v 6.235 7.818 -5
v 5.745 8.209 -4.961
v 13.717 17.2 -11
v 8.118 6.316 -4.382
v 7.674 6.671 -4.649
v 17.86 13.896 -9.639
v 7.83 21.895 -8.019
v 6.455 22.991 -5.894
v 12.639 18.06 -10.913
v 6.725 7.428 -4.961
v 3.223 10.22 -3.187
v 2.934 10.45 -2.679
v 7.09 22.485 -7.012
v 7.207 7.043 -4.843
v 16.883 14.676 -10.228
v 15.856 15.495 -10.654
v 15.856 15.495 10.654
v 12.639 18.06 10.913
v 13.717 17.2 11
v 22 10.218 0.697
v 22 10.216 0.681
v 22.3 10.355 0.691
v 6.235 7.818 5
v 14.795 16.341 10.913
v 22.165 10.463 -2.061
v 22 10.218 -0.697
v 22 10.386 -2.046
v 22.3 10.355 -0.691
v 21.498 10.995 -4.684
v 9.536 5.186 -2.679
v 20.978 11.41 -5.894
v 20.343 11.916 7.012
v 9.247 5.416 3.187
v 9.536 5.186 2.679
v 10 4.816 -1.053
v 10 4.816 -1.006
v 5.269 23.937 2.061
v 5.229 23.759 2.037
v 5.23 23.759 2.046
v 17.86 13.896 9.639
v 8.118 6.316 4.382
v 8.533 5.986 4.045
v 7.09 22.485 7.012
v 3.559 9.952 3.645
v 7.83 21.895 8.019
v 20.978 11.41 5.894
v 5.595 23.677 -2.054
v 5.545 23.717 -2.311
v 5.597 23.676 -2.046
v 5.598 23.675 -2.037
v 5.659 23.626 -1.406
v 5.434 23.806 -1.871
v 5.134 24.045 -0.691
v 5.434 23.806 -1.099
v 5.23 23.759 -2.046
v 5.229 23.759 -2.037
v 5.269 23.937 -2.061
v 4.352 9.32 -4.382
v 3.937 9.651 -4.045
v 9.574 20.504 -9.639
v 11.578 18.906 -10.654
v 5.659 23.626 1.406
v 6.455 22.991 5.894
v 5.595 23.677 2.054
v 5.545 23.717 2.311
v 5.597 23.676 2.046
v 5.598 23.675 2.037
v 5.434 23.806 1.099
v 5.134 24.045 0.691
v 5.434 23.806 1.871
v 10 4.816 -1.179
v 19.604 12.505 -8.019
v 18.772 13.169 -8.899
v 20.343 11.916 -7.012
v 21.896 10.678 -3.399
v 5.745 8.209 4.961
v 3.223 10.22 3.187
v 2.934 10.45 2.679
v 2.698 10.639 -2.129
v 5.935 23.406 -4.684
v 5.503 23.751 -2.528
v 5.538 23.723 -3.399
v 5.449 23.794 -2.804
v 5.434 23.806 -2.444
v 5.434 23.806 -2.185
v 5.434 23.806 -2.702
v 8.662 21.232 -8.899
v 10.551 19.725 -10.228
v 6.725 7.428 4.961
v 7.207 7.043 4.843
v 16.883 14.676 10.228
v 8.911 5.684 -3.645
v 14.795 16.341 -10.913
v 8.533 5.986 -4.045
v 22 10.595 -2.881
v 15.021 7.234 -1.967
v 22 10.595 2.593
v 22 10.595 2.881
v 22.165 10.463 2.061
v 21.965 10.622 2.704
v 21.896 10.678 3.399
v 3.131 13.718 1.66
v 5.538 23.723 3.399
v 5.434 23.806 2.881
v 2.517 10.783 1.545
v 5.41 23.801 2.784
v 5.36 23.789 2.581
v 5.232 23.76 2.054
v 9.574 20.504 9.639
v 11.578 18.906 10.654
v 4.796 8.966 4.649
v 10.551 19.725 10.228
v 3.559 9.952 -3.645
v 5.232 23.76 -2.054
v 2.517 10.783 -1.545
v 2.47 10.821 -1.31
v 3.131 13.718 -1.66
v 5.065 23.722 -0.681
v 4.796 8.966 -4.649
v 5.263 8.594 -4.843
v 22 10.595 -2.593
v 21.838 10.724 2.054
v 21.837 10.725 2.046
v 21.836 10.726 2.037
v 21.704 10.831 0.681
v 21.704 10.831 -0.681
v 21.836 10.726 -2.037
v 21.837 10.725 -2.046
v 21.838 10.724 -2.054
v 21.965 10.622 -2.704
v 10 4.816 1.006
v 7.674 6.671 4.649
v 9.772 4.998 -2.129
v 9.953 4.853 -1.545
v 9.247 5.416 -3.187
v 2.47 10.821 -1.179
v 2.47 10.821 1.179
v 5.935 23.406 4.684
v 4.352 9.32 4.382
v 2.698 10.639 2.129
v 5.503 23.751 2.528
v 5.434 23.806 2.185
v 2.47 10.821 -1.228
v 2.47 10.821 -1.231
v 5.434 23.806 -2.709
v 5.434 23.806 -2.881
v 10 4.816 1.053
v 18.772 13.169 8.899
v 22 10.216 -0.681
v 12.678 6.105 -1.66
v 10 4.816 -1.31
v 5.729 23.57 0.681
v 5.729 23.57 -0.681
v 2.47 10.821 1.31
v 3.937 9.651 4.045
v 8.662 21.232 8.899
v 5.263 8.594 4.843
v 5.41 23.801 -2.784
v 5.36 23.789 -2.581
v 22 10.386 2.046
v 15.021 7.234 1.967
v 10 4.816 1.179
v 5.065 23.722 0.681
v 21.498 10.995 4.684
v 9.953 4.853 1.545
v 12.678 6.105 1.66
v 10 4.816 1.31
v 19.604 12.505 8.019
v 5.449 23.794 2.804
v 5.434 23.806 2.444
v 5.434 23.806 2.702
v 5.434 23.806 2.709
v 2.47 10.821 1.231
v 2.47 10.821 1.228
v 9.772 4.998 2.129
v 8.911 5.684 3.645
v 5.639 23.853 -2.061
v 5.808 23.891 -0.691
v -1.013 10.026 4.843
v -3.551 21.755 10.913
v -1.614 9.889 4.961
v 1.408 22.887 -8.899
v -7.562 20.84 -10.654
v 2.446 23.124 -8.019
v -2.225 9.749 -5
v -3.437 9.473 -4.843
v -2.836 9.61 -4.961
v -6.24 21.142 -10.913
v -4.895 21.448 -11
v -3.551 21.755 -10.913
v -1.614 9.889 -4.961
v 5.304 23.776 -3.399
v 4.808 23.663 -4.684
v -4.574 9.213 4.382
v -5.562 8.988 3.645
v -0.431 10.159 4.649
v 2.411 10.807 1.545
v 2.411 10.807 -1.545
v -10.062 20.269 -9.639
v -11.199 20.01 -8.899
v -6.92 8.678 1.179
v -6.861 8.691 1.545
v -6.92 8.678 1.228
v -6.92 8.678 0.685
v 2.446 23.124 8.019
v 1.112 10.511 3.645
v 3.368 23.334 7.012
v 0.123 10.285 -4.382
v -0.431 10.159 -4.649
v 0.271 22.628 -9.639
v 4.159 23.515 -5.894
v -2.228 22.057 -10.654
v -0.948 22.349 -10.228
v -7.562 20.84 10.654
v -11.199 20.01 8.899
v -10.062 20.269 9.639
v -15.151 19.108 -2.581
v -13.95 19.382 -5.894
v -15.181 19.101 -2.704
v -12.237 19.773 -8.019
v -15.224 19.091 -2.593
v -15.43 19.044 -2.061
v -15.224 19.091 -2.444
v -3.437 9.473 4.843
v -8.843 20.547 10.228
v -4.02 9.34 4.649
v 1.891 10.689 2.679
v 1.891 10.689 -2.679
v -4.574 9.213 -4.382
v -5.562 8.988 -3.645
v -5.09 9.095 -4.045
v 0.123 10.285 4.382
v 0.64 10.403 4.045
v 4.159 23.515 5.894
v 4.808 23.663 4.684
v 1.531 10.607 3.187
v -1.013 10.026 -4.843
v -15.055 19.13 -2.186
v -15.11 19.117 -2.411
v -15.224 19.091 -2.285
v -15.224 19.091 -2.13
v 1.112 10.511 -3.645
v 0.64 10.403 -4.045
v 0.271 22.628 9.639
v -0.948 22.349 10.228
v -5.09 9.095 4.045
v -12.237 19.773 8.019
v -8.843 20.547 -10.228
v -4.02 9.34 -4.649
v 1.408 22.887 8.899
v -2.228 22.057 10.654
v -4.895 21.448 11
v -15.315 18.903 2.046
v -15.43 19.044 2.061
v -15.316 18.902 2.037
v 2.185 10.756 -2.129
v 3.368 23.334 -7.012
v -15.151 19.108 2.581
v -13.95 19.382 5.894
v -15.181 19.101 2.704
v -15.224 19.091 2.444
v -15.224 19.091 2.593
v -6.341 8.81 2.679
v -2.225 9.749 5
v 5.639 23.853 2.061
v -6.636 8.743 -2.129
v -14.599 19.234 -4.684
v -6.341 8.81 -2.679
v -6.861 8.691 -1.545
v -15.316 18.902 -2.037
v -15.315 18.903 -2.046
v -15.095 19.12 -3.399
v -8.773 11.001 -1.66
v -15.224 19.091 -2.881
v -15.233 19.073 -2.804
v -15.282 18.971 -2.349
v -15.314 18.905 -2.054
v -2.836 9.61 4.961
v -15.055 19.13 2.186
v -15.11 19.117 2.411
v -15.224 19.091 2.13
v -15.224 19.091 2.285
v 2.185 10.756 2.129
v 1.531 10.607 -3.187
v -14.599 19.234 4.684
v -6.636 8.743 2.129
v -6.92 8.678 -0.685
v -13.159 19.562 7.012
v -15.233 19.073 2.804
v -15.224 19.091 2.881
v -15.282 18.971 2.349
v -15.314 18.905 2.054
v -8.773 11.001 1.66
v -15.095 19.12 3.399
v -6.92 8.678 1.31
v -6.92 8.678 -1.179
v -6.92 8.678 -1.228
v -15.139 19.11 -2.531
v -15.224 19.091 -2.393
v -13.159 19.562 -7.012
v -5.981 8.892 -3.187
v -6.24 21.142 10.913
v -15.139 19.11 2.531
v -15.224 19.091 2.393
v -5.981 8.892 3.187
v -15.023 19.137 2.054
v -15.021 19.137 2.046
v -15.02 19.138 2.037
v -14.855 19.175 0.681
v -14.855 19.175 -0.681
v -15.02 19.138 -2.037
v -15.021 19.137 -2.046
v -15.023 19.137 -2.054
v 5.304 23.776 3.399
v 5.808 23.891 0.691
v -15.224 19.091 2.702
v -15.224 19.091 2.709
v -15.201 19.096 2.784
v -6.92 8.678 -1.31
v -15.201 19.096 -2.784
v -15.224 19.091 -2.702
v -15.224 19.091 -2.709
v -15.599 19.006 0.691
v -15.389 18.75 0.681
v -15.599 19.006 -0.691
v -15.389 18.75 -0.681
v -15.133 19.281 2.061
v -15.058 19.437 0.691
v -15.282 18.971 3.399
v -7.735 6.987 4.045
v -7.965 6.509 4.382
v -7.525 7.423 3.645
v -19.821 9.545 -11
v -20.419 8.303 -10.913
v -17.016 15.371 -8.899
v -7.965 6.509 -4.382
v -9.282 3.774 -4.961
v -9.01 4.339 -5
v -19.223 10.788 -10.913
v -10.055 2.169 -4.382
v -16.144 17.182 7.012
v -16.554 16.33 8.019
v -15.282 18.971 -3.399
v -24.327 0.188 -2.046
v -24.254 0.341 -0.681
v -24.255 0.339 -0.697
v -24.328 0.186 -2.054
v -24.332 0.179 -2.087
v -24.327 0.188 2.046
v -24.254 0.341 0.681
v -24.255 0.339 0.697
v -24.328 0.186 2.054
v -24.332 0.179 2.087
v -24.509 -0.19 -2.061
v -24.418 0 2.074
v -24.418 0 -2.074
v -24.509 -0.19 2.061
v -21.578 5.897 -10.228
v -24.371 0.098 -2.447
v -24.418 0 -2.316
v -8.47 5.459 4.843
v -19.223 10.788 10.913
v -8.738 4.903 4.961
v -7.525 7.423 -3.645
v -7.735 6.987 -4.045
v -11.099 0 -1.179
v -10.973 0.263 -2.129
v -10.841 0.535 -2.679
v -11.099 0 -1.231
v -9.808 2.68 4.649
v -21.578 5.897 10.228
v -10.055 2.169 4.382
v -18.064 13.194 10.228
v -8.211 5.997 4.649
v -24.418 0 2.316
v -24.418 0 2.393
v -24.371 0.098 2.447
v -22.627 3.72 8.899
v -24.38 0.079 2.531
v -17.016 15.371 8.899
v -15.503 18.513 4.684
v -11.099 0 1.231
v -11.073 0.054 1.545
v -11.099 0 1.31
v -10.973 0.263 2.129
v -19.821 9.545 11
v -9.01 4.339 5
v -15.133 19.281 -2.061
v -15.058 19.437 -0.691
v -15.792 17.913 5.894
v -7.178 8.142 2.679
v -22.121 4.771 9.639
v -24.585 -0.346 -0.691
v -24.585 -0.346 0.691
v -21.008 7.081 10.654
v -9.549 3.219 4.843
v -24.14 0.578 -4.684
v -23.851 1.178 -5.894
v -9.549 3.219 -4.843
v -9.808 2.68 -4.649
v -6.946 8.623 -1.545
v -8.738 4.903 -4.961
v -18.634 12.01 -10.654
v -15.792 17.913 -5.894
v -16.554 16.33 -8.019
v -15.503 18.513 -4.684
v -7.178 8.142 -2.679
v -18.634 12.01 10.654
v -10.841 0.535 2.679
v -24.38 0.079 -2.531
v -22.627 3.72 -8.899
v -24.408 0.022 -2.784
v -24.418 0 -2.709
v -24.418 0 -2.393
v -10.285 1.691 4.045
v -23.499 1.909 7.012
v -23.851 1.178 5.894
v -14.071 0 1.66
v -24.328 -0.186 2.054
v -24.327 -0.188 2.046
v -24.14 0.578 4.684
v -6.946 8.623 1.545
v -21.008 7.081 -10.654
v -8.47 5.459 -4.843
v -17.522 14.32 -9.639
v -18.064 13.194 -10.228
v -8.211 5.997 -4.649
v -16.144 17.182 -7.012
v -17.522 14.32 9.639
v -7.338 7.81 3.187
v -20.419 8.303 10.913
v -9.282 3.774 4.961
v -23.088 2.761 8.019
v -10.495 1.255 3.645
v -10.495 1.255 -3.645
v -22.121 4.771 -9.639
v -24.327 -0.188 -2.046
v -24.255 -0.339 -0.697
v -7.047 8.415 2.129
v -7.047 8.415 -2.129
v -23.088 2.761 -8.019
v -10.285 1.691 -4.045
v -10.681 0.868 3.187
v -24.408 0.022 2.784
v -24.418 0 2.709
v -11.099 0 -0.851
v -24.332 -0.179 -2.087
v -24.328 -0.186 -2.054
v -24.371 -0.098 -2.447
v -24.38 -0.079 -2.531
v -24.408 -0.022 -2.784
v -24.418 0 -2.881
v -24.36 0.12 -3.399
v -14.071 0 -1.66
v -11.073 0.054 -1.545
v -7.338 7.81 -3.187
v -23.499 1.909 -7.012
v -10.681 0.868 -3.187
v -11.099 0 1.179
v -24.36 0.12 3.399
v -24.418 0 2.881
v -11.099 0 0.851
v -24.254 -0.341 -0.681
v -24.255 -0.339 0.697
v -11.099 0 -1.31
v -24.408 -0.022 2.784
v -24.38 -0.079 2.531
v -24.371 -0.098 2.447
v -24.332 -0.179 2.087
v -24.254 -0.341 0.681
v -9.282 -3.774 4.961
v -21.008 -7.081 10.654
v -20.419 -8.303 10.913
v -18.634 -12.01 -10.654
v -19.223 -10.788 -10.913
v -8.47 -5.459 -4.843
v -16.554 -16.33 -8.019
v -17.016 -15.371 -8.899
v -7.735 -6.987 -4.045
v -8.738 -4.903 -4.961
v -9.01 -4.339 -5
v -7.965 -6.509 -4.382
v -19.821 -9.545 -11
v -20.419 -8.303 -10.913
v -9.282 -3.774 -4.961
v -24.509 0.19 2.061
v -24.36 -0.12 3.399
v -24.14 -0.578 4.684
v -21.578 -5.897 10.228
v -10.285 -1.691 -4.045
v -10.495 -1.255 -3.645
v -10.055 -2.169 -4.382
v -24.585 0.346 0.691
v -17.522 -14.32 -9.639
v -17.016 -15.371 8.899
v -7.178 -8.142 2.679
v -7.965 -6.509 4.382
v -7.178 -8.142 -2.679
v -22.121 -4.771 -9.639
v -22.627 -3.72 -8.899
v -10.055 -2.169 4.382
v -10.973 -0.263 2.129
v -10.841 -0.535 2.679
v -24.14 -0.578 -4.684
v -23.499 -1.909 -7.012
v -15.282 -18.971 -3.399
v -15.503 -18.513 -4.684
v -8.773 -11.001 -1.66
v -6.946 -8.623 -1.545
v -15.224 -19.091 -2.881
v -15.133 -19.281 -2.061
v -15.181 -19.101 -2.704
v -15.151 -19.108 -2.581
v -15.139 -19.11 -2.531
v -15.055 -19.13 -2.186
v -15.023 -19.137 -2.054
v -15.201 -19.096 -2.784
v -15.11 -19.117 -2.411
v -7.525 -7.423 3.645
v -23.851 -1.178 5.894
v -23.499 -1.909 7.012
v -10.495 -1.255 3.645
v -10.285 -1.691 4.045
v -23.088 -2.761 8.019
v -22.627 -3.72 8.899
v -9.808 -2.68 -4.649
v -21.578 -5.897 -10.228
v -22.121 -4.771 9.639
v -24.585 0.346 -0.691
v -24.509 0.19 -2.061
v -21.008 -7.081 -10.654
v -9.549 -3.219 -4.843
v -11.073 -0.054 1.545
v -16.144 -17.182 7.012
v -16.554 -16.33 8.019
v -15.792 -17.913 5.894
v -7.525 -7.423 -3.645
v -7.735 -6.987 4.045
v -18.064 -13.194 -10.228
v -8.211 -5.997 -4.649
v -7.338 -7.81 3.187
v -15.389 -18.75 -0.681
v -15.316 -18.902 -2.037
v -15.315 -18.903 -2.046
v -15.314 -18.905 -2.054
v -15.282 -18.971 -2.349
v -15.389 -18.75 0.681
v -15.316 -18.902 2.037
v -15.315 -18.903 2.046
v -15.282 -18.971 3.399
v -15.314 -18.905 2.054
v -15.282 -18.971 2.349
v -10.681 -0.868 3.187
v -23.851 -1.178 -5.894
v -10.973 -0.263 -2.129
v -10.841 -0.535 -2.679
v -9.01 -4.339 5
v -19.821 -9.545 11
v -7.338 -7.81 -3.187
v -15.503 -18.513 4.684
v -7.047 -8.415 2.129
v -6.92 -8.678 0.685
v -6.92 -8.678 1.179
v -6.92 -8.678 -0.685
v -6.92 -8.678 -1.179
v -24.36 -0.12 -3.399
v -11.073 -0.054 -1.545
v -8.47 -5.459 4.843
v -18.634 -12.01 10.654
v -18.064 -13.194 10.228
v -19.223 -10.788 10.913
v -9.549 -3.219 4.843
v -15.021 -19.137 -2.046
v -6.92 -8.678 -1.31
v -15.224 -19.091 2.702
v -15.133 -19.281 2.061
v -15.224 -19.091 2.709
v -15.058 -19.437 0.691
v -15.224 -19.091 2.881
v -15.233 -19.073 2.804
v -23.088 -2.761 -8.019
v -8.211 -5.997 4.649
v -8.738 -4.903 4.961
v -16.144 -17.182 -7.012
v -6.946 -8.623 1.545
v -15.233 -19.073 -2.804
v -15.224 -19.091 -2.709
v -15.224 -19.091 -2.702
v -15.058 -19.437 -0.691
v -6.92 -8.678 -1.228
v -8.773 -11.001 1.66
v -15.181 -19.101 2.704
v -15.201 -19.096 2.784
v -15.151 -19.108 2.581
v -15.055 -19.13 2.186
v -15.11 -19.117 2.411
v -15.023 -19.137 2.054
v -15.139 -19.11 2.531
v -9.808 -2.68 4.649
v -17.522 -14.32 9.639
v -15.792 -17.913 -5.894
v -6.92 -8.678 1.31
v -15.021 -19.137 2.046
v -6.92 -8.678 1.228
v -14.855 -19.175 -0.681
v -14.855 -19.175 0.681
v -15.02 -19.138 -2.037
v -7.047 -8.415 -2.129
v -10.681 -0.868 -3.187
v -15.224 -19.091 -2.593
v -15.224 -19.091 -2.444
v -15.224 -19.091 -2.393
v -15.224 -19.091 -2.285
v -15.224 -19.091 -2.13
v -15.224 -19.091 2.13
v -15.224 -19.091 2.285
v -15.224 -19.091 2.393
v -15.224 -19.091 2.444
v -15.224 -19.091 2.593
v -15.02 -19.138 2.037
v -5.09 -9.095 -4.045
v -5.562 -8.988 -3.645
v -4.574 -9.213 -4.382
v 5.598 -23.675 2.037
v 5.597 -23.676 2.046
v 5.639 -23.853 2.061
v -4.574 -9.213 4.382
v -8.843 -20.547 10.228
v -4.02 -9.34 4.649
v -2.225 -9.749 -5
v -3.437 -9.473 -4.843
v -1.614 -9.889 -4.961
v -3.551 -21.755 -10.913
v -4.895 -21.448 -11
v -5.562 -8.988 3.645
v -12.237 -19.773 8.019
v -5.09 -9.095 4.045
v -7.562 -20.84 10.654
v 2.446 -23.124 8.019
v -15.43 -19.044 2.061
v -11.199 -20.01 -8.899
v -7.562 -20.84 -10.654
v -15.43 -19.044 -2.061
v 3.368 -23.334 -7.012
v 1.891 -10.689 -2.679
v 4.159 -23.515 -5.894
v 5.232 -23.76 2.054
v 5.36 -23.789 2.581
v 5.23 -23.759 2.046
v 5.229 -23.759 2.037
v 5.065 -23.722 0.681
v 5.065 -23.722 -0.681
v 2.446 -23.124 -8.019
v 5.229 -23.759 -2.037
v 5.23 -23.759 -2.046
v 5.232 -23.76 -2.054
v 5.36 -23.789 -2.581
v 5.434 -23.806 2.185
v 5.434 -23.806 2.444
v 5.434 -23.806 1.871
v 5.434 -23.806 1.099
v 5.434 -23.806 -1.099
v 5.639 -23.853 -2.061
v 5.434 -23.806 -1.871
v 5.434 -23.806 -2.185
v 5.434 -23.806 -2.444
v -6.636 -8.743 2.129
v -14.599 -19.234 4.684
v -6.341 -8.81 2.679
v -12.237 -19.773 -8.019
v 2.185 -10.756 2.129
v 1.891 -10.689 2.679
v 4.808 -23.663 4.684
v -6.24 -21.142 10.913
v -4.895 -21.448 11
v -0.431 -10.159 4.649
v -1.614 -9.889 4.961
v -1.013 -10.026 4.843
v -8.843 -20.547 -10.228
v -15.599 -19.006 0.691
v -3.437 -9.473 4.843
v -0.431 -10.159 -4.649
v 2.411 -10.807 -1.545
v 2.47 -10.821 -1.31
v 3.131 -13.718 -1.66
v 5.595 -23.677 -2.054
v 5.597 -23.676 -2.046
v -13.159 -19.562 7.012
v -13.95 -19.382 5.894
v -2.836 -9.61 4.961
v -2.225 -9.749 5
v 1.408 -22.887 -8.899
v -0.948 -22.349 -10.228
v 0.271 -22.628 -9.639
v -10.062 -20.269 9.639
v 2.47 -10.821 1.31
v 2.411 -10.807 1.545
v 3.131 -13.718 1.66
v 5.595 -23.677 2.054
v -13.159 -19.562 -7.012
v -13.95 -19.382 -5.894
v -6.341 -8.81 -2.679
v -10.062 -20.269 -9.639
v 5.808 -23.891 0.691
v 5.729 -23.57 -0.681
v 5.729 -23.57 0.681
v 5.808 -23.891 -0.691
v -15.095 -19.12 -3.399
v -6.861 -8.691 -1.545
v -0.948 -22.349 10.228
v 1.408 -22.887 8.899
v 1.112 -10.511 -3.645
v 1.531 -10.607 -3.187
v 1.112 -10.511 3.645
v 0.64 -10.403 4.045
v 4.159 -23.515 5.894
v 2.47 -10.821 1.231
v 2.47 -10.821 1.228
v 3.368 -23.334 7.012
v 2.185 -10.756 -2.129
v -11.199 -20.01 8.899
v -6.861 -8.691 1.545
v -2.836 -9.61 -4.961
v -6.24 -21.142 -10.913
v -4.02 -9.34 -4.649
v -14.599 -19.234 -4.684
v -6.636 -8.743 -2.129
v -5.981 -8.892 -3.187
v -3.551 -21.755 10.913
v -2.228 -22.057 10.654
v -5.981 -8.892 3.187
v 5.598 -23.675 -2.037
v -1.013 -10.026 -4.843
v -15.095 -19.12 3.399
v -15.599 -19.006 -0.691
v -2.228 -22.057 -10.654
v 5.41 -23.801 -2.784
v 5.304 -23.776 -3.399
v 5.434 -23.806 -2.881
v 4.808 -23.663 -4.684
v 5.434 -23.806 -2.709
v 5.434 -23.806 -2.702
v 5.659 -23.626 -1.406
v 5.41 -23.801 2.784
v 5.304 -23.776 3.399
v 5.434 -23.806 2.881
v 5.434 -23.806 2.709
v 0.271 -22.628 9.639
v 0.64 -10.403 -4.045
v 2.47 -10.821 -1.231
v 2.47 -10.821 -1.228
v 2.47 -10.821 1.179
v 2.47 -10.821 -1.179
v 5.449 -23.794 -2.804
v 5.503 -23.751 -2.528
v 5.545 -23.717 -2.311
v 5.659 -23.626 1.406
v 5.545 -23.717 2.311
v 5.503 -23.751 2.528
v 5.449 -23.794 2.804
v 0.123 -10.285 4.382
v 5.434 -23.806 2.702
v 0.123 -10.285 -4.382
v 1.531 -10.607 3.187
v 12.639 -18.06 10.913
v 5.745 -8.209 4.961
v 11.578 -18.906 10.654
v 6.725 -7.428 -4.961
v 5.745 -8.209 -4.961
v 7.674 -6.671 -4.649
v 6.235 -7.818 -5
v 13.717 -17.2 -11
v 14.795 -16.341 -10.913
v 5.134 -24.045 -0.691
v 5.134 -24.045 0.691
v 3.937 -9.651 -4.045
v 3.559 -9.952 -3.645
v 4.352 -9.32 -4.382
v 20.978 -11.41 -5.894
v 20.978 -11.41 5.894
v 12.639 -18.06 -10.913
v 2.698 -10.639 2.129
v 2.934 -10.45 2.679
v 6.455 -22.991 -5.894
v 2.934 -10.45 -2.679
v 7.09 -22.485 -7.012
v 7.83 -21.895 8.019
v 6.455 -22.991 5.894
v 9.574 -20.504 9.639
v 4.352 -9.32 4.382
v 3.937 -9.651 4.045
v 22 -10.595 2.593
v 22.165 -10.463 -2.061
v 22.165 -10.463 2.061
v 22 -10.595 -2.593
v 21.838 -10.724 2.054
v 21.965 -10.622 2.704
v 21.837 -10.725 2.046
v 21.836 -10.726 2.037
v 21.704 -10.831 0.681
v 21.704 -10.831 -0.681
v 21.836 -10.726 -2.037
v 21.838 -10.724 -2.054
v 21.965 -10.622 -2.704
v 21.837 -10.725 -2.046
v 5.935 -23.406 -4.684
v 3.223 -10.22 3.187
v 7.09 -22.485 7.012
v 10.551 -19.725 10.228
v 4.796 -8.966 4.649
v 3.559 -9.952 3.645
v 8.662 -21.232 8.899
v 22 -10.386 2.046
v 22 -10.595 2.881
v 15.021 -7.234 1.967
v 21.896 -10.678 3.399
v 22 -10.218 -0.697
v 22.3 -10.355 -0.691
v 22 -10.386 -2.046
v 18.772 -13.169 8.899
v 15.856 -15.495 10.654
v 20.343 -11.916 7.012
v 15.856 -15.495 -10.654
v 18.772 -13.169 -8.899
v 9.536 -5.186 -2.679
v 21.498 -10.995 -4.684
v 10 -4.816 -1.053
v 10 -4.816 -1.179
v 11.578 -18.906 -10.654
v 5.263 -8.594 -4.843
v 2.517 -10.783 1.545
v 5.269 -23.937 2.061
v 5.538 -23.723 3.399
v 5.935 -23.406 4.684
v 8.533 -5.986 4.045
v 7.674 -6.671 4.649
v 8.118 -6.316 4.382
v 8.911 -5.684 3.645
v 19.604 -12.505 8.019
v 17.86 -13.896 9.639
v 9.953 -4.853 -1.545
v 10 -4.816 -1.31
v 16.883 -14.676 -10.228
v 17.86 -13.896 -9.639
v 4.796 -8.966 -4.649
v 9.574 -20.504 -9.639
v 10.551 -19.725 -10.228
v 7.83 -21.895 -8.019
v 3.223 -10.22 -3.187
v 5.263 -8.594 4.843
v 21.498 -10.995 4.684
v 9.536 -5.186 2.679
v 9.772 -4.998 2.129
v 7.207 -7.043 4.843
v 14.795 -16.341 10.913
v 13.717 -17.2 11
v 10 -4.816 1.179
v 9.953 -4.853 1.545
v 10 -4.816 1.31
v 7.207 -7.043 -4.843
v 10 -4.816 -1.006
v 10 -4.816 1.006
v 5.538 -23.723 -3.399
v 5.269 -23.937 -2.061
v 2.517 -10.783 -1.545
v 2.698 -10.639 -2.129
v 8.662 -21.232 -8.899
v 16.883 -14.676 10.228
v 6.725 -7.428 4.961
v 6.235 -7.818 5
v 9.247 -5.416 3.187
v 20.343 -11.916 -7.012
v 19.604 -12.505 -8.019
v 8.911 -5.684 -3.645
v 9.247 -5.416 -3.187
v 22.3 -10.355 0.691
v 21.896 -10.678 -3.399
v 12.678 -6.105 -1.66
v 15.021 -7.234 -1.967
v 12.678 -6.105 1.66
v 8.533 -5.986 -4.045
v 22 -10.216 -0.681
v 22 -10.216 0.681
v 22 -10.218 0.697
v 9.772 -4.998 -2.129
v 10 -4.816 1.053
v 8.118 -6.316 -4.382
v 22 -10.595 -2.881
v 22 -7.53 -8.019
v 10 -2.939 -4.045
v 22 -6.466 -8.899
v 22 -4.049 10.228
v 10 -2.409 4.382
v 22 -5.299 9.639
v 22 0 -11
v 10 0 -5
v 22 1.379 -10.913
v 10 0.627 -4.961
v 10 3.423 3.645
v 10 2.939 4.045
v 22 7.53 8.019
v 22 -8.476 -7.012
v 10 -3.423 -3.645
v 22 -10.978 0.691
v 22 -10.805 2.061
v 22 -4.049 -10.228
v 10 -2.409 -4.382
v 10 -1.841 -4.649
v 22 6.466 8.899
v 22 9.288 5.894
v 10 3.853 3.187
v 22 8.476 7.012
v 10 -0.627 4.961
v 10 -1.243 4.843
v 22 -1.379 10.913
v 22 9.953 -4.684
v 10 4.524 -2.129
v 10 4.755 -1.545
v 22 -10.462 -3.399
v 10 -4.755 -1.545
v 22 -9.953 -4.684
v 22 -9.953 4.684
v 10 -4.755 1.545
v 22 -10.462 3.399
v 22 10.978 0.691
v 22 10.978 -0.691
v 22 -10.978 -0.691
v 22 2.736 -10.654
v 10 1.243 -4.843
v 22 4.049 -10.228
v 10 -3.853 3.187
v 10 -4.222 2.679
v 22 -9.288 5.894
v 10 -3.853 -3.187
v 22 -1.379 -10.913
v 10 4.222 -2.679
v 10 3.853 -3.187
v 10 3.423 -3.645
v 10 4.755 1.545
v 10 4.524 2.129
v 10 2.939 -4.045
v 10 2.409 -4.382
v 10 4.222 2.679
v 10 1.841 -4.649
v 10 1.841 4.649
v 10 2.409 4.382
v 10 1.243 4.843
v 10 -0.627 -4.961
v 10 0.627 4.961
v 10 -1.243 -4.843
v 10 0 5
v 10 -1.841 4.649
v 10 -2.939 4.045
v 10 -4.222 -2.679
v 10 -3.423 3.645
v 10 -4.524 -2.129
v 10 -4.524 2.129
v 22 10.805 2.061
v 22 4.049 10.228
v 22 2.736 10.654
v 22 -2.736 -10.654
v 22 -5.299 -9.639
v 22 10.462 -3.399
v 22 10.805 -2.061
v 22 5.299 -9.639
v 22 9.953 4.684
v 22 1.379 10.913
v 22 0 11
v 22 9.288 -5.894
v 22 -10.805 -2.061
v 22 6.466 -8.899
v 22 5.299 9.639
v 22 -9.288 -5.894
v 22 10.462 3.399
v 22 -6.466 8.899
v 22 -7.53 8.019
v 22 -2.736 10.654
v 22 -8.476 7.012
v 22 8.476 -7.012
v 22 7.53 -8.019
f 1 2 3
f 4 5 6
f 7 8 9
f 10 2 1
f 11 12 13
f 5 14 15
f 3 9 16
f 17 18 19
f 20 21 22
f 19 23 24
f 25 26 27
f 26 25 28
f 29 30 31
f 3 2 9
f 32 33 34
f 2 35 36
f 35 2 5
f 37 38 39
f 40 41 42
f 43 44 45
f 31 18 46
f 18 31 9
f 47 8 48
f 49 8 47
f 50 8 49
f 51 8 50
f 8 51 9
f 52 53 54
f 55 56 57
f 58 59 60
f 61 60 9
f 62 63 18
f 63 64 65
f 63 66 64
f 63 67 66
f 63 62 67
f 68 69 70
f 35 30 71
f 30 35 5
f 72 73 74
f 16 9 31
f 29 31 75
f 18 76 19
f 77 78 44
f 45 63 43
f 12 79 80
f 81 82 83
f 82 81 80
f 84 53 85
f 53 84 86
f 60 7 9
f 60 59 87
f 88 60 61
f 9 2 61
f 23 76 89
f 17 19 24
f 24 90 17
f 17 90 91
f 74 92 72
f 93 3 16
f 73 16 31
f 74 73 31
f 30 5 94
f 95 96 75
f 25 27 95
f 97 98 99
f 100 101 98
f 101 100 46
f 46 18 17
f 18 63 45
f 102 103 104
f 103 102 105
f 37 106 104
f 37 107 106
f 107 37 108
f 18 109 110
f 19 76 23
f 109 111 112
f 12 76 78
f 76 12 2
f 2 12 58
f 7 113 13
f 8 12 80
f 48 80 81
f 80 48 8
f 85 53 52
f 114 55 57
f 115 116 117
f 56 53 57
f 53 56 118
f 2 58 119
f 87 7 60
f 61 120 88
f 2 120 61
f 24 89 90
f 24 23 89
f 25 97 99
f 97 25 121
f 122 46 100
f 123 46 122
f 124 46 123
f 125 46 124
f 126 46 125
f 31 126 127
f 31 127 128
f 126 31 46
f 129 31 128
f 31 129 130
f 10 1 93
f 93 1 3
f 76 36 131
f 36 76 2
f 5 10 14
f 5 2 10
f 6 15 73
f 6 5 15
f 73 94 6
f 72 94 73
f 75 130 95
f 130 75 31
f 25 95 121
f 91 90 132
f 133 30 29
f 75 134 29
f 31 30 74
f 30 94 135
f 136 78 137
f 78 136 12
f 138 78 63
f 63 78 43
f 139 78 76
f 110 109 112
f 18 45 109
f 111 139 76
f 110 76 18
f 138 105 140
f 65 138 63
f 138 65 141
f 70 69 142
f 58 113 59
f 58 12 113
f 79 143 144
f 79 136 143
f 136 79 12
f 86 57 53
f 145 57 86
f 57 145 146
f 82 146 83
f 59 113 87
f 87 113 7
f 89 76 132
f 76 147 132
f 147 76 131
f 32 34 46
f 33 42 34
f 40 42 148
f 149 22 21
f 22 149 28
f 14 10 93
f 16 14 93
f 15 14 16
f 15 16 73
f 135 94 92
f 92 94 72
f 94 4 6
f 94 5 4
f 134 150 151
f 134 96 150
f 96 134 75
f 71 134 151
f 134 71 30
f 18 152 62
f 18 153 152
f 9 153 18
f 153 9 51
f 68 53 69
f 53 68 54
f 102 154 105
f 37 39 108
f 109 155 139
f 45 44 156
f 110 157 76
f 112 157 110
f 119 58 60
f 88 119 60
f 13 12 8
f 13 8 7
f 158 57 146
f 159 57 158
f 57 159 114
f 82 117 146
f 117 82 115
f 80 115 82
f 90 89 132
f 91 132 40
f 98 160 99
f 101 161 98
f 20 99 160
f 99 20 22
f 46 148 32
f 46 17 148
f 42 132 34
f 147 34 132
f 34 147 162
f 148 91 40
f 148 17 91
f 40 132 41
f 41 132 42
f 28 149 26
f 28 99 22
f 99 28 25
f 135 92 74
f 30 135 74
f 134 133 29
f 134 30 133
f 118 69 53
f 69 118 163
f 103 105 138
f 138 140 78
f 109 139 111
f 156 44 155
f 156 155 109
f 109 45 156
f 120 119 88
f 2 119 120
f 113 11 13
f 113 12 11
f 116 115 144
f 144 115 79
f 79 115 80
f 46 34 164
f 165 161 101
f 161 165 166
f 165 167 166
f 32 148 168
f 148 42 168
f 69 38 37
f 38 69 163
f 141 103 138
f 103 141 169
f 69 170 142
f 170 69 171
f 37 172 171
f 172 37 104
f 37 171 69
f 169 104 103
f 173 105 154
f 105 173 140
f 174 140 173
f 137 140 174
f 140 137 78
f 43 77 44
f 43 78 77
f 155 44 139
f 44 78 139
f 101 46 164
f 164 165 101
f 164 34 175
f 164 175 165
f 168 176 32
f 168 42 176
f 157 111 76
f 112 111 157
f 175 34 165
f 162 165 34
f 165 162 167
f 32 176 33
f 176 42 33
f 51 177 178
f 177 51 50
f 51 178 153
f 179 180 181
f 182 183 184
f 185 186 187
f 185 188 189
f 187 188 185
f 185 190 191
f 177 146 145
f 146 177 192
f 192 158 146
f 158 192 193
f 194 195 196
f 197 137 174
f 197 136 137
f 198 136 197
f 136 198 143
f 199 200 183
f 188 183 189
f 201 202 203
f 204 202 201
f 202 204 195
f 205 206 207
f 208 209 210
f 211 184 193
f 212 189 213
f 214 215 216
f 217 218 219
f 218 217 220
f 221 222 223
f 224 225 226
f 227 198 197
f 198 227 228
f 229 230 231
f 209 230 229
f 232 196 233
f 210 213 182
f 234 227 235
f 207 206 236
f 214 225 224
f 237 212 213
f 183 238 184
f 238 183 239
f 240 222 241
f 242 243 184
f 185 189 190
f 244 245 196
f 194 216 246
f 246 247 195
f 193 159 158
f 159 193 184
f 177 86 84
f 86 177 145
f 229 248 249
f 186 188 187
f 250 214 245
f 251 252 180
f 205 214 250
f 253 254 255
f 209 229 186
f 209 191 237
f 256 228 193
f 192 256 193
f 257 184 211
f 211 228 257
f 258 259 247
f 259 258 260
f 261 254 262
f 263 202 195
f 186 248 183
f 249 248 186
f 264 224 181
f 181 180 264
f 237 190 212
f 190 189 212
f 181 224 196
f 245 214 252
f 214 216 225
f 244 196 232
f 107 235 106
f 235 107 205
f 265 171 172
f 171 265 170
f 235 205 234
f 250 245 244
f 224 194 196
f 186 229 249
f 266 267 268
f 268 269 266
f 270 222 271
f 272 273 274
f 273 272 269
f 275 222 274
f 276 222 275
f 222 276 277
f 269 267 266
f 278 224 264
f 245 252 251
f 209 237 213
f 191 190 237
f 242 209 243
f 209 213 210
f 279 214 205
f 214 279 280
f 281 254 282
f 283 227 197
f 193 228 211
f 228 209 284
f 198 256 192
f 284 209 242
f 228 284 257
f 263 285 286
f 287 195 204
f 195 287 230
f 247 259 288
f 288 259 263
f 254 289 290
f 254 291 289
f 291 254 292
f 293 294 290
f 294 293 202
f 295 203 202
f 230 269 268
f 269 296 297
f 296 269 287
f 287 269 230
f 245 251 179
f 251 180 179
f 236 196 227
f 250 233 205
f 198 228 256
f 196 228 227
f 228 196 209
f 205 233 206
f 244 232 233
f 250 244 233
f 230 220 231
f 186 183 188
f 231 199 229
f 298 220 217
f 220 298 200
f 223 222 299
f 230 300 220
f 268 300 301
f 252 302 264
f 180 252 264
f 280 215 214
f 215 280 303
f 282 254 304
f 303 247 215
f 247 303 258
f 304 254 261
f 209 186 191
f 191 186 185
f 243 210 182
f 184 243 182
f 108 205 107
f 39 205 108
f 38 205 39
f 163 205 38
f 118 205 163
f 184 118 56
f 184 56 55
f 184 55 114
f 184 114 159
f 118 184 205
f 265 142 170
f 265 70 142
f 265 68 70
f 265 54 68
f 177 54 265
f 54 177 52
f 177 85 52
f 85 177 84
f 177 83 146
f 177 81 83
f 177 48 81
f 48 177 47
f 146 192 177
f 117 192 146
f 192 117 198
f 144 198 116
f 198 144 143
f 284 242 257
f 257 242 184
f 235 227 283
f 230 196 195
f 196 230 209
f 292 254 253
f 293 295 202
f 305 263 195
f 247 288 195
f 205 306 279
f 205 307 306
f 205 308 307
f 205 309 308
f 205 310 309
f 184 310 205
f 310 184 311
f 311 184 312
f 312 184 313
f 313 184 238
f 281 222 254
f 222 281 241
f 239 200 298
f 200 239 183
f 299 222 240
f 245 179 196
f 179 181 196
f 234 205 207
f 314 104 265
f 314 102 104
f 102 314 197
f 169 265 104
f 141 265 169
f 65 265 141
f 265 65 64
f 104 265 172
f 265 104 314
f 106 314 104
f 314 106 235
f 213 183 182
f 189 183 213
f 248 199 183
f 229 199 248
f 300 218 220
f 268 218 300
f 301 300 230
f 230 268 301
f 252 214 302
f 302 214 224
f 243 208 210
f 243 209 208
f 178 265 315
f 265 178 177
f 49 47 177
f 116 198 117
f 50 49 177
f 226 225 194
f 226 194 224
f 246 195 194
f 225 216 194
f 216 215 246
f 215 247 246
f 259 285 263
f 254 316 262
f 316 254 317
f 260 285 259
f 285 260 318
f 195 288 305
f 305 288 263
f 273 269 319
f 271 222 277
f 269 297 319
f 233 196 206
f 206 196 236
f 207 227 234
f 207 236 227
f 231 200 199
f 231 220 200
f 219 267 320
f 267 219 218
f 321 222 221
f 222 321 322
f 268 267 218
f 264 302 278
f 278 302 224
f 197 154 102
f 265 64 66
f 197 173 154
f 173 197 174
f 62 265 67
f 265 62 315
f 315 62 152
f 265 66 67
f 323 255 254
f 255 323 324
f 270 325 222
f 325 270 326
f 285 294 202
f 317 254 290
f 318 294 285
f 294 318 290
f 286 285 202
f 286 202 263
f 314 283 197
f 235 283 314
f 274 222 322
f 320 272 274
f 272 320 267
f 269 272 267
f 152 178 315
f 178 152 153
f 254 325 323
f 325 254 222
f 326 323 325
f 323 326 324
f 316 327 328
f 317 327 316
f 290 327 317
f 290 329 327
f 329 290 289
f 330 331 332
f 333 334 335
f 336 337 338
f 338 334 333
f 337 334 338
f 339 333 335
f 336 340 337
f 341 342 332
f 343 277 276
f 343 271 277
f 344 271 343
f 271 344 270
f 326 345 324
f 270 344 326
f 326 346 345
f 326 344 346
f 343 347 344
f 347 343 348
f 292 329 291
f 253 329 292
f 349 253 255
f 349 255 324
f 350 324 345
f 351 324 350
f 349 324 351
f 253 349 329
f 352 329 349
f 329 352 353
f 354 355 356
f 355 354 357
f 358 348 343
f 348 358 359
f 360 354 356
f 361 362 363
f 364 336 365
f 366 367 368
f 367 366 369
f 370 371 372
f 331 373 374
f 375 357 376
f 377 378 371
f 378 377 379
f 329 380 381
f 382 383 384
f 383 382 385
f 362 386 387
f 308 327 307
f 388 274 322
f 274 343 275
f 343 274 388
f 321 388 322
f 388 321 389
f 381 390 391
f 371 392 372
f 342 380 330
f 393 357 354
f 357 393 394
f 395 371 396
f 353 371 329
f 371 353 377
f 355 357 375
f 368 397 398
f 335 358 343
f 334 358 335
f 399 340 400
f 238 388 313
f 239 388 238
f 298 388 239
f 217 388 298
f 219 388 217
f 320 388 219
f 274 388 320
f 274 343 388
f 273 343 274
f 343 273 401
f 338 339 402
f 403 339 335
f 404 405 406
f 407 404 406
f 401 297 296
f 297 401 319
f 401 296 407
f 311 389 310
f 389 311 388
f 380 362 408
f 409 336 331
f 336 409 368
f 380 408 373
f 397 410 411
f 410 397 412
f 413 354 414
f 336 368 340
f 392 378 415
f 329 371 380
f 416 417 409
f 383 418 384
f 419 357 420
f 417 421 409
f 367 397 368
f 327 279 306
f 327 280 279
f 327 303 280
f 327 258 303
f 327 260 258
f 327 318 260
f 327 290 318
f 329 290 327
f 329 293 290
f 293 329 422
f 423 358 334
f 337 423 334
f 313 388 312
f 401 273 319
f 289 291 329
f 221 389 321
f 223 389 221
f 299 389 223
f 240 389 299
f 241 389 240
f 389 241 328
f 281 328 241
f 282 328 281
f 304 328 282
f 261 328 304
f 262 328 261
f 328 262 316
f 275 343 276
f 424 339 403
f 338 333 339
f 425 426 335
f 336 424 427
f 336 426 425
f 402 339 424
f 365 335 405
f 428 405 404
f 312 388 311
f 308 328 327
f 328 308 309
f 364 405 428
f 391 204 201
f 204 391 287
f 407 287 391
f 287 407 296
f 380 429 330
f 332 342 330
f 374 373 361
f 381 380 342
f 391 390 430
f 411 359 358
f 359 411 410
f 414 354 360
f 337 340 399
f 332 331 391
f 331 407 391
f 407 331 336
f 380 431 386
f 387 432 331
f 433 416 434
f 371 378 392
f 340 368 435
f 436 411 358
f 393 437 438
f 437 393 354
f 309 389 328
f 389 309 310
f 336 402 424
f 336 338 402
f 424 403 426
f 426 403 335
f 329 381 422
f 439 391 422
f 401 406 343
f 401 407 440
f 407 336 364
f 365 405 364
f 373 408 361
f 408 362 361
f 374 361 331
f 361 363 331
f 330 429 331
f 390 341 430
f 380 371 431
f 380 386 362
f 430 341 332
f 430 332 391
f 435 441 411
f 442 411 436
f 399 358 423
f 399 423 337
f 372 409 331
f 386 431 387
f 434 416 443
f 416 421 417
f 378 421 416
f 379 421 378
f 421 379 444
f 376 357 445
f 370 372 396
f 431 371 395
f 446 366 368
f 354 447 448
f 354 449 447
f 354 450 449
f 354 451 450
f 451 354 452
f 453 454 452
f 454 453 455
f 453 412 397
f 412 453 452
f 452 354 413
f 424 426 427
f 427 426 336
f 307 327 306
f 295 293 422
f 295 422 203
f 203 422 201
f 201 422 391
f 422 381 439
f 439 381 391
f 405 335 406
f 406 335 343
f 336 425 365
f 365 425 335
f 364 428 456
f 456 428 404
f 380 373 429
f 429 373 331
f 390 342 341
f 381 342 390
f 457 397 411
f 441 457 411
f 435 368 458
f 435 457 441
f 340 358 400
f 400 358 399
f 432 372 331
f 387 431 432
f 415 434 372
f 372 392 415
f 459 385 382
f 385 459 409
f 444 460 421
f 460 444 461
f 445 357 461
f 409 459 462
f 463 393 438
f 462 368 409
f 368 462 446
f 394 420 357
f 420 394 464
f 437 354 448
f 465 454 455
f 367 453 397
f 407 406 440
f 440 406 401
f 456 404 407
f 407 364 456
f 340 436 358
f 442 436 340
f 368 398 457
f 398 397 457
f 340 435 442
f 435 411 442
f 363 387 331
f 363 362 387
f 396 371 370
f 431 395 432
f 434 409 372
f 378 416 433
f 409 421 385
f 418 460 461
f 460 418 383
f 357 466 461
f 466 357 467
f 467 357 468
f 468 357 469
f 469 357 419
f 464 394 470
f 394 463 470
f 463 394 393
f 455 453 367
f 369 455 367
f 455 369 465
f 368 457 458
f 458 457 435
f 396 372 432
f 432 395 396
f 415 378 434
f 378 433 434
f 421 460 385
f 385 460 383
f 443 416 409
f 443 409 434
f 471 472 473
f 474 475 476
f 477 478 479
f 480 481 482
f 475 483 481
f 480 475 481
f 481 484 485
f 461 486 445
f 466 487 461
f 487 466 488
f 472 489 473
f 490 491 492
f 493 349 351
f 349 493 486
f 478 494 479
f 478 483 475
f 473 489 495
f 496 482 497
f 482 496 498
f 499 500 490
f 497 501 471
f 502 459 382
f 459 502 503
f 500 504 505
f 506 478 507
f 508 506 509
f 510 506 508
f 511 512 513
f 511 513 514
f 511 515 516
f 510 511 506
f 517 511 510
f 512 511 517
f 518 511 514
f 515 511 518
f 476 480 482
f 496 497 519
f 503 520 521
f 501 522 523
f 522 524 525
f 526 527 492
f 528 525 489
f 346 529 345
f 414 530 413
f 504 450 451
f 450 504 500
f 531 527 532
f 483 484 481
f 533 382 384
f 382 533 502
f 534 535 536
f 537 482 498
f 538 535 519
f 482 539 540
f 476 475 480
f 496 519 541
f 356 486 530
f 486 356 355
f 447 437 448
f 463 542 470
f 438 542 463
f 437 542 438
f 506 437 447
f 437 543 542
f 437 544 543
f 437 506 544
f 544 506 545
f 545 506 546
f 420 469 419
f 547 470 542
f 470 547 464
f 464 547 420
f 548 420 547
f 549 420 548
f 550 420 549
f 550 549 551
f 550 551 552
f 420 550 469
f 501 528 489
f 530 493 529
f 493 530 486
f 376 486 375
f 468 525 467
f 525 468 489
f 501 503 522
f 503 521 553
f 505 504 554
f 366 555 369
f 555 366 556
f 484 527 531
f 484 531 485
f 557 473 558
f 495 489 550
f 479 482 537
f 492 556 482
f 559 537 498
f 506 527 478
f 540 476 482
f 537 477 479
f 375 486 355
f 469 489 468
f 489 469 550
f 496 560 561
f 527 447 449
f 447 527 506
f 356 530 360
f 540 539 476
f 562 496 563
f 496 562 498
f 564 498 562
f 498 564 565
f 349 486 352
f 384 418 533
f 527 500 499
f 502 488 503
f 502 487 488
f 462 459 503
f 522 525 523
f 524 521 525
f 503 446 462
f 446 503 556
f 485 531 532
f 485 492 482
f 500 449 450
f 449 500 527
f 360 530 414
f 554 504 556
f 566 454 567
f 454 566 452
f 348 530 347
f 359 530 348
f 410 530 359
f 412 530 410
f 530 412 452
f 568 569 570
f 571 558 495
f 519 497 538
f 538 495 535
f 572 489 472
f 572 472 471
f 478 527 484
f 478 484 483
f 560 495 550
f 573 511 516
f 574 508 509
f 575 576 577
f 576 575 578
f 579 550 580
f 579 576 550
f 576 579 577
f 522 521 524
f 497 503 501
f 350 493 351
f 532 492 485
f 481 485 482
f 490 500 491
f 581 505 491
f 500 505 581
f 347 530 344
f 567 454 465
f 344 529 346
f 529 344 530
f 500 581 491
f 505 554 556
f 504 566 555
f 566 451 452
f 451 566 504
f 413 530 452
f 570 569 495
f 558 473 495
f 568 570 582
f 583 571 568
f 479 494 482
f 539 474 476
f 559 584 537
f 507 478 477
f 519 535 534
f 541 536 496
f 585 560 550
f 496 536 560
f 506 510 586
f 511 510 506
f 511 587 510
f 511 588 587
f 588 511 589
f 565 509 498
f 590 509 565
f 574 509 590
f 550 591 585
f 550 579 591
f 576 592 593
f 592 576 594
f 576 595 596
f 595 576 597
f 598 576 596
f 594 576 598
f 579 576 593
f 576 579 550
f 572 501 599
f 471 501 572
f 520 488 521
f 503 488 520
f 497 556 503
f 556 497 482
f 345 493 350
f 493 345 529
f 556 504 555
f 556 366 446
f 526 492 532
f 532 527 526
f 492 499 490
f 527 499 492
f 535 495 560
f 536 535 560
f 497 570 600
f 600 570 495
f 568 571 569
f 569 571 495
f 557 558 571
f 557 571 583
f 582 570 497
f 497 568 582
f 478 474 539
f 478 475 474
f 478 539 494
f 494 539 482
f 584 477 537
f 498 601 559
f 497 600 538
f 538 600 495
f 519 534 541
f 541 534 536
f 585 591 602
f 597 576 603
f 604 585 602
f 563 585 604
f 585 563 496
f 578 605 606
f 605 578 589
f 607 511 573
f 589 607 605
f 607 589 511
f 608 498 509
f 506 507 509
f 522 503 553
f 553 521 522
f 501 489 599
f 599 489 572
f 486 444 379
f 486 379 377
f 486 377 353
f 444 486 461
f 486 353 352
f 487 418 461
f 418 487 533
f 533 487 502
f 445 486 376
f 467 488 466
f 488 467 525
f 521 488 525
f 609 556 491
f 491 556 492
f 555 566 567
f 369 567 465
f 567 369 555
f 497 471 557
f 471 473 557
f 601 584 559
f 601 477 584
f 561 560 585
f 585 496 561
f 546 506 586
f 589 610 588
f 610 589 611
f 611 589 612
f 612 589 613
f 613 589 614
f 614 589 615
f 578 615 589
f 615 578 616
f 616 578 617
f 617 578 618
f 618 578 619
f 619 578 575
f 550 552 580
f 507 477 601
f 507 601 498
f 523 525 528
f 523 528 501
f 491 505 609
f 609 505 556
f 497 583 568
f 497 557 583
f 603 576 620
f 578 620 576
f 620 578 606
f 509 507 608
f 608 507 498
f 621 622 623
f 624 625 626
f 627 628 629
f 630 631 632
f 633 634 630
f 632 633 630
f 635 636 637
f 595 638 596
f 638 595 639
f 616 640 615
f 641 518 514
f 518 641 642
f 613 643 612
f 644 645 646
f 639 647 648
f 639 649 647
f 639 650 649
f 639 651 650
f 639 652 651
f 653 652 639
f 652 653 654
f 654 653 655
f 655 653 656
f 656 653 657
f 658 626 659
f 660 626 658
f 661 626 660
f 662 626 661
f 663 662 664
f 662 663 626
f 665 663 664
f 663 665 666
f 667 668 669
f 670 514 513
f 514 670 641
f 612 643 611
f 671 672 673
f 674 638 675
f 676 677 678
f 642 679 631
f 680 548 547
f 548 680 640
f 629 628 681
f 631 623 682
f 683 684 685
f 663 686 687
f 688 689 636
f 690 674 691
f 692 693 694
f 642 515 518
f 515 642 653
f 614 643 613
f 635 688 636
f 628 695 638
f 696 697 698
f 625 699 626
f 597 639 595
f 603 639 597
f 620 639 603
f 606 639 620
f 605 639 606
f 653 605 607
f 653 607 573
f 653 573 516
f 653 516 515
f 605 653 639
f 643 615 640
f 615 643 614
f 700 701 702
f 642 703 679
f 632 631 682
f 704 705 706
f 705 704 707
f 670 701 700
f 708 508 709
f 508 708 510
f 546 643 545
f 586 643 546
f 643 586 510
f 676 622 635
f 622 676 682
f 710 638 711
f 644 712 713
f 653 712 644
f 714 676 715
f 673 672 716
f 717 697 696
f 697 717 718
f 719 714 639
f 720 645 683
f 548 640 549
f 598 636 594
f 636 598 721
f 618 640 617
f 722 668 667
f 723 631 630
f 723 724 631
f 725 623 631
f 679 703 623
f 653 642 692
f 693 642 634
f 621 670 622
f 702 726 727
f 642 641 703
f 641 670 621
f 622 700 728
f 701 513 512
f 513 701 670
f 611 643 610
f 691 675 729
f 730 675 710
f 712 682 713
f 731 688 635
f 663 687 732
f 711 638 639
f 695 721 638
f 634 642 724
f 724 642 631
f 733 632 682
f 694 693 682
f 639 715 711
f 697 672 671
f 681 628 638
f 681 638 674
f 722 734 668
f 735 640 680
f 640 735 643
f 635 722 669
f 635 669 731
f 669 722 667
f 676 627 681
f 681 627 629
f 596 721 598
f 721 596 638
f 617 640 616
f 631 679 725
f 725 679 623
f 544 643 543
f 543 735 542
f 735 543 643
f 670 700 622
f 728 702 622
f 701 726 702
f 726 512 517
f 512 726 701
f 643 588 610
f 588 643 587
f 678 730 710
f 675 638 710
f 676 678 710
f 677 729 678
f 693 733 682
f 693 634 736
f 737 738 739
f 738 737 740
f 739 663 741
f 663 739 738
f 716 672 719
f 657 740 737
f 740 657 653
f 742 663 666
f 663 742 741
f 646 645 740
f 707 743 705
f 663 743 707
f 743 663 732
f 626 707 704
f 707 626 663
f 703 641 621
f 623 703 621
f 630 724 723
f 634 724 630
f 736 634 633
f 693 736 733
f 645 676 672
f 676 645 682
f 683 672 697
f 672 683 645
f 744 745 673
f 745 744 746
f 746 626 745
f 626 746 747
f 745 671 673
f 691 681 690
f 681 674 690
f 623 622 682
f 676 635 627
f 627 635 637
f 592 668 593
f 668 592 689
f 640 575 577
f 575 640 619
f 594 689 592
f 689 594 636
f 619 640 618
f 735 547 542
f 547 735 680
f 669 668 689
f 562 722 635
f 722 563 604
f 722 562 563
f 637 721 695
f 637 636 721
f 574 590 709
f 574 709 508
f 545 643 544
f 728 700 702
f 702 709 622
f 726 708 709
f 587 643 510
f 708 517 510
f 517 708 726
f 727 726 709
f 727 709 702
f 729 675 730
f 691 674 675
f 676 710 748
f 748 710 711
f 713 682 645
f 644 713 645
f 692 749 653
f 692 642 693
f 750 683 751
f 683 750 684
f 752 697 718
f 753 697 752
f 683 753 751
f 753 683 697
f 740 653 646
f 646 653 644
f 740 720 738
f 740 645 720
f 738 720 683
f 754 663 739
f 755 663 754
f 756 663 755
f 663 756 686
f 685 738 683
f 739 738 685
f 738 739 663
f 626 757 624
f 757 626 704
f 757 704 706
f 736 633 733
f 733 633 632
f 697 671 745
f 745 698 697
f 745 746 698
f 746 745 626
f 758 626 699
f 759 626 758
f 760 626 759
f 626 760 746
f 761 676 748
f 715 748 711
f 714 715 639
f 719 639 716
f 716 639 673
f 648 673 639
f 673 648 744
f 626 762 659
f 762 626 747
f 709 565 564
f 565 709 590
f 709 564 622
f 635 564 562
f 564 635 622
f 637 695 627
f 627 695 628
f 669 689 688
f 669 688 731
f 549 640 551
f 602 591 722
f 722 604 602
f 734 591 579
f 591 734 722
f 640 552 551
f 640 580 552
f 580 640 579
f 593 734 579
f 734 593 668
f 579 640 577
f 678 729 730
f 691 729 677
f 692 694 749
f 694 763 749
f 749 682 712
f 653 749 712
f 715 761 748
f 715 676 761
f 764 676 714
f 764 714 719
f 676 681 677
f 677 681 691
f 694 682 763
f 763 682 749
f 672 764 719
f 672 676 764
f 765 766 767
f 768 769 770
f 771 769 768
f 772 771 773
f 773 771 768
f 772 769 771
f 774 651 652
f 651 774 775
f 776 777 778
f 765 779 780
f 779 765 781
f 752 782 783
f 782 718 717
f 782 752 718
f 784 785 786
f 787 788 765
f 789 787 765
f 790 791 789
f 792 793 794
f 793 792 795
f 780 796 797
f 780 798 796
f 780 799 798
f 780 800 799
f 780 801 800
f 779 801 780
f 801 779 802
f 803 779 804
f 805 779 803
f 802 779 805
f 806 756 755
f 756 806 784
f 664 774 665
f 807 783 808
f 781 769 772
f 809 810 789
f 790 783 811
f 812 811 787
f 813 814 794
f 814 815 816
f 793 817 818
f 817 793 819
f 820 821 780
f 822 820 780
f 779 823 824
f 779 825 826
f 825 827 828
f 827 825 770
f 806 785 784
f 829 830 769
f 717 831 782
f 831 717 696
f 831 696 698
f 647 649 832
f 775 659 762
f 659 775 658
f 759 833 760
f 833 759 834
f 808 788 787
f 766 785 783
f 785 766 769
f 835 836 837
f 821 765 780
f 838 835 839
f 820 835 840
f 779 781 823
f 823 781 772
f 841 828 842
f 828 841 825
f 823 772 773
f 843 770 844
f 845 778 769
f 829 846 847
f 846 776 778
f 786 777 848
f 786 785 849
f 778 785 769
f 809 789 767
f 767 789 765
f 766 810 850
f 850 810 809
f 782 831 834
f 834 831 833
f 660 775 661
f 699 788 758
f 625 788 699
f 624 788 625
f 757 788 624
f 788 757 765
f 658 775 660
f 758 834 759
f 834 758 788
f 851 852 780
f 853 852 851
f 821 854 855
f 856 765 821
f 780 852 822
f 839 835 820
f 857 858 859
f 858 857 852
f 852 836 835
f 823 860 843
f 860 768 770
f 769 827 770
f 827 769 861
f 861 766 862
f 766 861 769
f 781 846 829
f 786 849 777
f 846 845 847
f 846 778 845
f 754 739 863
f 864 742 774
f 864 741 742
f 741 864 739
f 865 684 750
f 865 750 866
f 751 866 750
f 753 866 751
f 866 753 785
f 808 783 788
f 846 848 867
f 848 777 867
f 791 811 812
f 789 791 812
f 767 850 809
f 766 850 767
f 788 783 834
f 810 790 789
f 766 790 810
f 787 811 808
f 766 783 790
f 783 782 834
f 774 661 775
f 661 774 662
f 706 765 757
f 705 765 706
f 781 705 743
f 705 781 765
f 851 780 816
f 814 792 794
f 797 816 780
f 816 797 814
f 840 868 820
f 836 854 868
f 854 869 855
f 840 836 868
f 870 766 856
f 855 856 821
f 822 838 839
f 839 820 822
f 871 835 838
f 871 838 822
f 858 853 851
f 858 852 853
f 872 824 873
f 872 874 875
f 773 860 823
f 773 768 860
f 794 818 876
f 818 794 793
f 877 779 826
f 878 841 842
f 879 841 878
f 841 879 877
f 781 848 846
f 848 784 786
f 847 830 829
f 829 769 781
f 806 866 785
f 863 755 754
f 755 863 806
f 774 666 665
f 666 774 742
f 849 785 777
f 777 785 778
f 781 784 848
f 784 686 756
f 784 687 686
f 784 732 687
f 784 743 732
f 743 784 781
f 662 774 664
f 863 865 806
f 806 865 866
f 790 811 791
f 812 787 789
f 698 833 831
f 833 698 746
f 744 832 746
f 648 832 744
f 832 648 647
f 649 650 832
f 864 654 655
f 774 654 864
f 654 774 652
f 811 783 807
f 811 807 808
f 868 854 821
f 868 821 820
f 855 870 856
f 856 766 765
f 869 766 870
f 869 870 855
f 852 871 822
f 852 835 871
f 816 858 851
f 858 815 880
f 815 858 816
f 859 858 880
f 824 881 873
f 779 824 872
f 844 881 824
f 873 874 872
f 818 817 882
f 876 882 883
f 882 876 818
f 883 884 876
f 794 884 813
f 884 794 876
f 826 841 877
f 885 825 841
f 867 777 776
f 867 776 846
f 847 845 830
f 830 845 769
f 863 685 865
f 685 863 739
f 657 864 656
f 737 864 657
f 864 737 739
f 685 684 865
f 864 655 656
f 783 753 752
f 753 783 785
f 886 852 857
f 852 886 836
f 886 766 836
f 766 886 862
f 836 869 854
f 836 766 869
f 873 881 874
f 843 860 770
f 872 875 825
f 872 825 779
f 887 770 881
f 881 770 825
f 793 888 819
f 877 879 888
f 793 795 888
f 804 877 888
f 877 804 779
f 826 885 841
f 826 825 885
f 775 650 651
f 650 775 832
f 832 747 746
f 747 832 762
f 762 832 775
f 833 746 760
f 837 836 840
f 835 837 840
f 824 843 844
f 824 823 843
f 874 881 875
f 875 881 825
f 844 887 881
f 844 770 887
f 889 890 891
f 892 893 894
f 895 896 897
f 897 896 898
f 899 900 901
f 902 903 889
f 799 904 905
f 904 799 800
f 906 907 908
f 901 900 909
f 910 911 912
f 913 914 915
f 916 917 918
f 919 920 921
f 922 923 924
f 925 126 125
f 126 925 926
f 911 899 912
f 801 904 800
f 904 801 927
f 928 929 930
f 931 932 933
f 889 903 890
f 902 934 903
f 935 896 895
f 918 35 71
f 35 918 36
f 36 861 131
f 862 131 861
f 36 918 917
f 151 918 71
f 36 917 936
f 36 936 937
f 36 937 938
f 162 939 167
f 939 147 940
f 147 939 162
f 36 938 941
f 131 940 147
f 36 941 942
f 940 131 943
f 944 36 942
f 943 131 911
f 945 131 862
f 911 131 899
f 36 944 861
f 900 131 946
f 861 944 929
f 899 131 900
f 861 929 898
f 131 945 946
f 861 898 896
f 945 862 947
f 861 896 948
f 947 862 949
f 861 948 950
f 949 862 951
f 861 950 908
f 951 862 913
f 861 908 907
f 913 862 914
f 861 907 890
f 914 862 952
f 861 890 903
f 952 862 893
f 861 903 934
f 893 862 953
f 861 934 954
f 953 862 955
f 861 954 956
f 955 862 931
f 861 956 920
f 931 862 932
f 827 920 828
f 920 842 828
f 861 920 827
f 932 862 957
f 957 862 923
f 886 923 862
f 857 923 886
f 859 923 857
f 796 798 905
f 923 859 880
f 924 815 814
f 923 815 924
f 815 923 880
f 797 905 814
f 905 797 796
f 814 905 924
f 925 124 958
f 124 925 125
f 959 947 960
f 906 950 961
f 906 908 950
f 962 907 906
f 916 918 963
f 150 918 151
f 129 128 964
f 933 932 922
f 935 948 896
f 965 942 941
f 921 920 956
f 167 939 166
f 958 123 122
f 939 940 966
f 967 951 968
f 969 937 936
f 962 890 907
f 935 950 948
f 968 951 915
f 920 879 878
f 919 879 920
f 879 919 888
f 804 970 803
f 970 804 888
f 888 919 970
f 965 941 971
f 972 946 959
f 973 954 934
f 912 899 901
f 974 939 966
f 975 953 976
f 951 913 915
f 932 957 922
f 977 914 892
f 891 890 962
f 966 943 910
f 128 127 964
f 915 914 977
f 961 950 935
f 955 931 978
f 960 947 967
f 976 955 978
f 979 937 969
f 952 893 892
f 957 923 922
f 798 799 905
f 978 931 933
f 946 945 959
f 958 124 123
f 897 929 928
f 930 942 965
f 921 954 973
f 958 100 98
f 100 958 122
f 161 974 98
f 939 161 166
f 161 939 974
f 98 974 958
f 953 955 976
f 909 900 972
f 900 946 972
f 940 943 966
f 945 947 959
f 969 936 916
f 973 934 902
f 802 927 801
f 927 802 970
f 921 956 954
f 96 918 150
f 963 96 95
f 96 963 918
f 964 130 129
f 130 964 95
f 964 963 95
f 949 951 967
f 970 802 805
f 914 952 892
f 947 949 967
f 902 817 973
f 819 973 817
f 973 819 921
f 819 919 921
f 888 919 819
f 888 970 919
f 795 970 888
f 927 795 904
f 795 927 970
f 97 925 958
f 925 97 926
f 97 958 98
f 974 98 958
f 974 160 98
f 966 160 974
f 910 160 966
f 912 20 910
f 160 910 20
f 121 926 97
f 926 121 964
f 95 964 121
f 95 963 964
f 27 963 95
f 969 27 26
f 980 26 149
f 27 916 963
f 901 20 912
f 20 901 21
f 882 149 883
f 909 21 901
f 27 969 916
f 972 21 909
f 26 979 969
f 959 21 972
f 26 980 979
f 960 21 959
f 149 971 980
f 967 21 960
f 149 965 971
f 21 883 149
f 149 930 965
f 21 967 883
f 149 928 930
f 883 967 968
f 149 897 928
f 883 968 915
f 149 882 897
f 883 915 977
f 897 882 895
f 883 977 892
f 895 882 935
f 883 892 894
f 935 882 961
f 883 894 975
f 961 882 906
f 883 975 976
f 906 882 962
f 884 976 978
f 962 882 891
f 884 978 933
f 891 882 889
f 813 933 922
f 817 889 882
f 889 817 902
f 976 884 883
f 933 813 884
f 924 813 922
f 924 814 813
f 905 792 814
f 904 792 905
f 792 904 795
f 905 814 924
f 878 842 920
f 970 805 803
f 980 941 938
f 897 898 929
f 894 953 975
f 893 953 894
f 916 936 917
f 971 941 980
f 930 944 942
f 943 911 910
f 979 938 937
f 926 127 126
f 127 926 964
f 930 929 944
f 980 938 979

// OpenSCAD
$fn = 50;
width = 25;
height = 15;
thick = 3;
nholes = 7;
holr = 1;

/*
difference(){
	cube([width, height, thick]);
	for (i = [1:nholes]){
		echo(i);
		translate([width/(nholes+1) * i,
				height / 2, thick / 2])
		cylinder(r = holr, h = thick + 3, center = true);
	}
}
*/

for (i = [1: nholes]) {
	rotate([0, 0, (360 / nholes) * i])
	translate([10,0,0])
	rotate([0,90,0])
	cylinder(r1=5, r2=11, h=12);
}
//%cube(15);
